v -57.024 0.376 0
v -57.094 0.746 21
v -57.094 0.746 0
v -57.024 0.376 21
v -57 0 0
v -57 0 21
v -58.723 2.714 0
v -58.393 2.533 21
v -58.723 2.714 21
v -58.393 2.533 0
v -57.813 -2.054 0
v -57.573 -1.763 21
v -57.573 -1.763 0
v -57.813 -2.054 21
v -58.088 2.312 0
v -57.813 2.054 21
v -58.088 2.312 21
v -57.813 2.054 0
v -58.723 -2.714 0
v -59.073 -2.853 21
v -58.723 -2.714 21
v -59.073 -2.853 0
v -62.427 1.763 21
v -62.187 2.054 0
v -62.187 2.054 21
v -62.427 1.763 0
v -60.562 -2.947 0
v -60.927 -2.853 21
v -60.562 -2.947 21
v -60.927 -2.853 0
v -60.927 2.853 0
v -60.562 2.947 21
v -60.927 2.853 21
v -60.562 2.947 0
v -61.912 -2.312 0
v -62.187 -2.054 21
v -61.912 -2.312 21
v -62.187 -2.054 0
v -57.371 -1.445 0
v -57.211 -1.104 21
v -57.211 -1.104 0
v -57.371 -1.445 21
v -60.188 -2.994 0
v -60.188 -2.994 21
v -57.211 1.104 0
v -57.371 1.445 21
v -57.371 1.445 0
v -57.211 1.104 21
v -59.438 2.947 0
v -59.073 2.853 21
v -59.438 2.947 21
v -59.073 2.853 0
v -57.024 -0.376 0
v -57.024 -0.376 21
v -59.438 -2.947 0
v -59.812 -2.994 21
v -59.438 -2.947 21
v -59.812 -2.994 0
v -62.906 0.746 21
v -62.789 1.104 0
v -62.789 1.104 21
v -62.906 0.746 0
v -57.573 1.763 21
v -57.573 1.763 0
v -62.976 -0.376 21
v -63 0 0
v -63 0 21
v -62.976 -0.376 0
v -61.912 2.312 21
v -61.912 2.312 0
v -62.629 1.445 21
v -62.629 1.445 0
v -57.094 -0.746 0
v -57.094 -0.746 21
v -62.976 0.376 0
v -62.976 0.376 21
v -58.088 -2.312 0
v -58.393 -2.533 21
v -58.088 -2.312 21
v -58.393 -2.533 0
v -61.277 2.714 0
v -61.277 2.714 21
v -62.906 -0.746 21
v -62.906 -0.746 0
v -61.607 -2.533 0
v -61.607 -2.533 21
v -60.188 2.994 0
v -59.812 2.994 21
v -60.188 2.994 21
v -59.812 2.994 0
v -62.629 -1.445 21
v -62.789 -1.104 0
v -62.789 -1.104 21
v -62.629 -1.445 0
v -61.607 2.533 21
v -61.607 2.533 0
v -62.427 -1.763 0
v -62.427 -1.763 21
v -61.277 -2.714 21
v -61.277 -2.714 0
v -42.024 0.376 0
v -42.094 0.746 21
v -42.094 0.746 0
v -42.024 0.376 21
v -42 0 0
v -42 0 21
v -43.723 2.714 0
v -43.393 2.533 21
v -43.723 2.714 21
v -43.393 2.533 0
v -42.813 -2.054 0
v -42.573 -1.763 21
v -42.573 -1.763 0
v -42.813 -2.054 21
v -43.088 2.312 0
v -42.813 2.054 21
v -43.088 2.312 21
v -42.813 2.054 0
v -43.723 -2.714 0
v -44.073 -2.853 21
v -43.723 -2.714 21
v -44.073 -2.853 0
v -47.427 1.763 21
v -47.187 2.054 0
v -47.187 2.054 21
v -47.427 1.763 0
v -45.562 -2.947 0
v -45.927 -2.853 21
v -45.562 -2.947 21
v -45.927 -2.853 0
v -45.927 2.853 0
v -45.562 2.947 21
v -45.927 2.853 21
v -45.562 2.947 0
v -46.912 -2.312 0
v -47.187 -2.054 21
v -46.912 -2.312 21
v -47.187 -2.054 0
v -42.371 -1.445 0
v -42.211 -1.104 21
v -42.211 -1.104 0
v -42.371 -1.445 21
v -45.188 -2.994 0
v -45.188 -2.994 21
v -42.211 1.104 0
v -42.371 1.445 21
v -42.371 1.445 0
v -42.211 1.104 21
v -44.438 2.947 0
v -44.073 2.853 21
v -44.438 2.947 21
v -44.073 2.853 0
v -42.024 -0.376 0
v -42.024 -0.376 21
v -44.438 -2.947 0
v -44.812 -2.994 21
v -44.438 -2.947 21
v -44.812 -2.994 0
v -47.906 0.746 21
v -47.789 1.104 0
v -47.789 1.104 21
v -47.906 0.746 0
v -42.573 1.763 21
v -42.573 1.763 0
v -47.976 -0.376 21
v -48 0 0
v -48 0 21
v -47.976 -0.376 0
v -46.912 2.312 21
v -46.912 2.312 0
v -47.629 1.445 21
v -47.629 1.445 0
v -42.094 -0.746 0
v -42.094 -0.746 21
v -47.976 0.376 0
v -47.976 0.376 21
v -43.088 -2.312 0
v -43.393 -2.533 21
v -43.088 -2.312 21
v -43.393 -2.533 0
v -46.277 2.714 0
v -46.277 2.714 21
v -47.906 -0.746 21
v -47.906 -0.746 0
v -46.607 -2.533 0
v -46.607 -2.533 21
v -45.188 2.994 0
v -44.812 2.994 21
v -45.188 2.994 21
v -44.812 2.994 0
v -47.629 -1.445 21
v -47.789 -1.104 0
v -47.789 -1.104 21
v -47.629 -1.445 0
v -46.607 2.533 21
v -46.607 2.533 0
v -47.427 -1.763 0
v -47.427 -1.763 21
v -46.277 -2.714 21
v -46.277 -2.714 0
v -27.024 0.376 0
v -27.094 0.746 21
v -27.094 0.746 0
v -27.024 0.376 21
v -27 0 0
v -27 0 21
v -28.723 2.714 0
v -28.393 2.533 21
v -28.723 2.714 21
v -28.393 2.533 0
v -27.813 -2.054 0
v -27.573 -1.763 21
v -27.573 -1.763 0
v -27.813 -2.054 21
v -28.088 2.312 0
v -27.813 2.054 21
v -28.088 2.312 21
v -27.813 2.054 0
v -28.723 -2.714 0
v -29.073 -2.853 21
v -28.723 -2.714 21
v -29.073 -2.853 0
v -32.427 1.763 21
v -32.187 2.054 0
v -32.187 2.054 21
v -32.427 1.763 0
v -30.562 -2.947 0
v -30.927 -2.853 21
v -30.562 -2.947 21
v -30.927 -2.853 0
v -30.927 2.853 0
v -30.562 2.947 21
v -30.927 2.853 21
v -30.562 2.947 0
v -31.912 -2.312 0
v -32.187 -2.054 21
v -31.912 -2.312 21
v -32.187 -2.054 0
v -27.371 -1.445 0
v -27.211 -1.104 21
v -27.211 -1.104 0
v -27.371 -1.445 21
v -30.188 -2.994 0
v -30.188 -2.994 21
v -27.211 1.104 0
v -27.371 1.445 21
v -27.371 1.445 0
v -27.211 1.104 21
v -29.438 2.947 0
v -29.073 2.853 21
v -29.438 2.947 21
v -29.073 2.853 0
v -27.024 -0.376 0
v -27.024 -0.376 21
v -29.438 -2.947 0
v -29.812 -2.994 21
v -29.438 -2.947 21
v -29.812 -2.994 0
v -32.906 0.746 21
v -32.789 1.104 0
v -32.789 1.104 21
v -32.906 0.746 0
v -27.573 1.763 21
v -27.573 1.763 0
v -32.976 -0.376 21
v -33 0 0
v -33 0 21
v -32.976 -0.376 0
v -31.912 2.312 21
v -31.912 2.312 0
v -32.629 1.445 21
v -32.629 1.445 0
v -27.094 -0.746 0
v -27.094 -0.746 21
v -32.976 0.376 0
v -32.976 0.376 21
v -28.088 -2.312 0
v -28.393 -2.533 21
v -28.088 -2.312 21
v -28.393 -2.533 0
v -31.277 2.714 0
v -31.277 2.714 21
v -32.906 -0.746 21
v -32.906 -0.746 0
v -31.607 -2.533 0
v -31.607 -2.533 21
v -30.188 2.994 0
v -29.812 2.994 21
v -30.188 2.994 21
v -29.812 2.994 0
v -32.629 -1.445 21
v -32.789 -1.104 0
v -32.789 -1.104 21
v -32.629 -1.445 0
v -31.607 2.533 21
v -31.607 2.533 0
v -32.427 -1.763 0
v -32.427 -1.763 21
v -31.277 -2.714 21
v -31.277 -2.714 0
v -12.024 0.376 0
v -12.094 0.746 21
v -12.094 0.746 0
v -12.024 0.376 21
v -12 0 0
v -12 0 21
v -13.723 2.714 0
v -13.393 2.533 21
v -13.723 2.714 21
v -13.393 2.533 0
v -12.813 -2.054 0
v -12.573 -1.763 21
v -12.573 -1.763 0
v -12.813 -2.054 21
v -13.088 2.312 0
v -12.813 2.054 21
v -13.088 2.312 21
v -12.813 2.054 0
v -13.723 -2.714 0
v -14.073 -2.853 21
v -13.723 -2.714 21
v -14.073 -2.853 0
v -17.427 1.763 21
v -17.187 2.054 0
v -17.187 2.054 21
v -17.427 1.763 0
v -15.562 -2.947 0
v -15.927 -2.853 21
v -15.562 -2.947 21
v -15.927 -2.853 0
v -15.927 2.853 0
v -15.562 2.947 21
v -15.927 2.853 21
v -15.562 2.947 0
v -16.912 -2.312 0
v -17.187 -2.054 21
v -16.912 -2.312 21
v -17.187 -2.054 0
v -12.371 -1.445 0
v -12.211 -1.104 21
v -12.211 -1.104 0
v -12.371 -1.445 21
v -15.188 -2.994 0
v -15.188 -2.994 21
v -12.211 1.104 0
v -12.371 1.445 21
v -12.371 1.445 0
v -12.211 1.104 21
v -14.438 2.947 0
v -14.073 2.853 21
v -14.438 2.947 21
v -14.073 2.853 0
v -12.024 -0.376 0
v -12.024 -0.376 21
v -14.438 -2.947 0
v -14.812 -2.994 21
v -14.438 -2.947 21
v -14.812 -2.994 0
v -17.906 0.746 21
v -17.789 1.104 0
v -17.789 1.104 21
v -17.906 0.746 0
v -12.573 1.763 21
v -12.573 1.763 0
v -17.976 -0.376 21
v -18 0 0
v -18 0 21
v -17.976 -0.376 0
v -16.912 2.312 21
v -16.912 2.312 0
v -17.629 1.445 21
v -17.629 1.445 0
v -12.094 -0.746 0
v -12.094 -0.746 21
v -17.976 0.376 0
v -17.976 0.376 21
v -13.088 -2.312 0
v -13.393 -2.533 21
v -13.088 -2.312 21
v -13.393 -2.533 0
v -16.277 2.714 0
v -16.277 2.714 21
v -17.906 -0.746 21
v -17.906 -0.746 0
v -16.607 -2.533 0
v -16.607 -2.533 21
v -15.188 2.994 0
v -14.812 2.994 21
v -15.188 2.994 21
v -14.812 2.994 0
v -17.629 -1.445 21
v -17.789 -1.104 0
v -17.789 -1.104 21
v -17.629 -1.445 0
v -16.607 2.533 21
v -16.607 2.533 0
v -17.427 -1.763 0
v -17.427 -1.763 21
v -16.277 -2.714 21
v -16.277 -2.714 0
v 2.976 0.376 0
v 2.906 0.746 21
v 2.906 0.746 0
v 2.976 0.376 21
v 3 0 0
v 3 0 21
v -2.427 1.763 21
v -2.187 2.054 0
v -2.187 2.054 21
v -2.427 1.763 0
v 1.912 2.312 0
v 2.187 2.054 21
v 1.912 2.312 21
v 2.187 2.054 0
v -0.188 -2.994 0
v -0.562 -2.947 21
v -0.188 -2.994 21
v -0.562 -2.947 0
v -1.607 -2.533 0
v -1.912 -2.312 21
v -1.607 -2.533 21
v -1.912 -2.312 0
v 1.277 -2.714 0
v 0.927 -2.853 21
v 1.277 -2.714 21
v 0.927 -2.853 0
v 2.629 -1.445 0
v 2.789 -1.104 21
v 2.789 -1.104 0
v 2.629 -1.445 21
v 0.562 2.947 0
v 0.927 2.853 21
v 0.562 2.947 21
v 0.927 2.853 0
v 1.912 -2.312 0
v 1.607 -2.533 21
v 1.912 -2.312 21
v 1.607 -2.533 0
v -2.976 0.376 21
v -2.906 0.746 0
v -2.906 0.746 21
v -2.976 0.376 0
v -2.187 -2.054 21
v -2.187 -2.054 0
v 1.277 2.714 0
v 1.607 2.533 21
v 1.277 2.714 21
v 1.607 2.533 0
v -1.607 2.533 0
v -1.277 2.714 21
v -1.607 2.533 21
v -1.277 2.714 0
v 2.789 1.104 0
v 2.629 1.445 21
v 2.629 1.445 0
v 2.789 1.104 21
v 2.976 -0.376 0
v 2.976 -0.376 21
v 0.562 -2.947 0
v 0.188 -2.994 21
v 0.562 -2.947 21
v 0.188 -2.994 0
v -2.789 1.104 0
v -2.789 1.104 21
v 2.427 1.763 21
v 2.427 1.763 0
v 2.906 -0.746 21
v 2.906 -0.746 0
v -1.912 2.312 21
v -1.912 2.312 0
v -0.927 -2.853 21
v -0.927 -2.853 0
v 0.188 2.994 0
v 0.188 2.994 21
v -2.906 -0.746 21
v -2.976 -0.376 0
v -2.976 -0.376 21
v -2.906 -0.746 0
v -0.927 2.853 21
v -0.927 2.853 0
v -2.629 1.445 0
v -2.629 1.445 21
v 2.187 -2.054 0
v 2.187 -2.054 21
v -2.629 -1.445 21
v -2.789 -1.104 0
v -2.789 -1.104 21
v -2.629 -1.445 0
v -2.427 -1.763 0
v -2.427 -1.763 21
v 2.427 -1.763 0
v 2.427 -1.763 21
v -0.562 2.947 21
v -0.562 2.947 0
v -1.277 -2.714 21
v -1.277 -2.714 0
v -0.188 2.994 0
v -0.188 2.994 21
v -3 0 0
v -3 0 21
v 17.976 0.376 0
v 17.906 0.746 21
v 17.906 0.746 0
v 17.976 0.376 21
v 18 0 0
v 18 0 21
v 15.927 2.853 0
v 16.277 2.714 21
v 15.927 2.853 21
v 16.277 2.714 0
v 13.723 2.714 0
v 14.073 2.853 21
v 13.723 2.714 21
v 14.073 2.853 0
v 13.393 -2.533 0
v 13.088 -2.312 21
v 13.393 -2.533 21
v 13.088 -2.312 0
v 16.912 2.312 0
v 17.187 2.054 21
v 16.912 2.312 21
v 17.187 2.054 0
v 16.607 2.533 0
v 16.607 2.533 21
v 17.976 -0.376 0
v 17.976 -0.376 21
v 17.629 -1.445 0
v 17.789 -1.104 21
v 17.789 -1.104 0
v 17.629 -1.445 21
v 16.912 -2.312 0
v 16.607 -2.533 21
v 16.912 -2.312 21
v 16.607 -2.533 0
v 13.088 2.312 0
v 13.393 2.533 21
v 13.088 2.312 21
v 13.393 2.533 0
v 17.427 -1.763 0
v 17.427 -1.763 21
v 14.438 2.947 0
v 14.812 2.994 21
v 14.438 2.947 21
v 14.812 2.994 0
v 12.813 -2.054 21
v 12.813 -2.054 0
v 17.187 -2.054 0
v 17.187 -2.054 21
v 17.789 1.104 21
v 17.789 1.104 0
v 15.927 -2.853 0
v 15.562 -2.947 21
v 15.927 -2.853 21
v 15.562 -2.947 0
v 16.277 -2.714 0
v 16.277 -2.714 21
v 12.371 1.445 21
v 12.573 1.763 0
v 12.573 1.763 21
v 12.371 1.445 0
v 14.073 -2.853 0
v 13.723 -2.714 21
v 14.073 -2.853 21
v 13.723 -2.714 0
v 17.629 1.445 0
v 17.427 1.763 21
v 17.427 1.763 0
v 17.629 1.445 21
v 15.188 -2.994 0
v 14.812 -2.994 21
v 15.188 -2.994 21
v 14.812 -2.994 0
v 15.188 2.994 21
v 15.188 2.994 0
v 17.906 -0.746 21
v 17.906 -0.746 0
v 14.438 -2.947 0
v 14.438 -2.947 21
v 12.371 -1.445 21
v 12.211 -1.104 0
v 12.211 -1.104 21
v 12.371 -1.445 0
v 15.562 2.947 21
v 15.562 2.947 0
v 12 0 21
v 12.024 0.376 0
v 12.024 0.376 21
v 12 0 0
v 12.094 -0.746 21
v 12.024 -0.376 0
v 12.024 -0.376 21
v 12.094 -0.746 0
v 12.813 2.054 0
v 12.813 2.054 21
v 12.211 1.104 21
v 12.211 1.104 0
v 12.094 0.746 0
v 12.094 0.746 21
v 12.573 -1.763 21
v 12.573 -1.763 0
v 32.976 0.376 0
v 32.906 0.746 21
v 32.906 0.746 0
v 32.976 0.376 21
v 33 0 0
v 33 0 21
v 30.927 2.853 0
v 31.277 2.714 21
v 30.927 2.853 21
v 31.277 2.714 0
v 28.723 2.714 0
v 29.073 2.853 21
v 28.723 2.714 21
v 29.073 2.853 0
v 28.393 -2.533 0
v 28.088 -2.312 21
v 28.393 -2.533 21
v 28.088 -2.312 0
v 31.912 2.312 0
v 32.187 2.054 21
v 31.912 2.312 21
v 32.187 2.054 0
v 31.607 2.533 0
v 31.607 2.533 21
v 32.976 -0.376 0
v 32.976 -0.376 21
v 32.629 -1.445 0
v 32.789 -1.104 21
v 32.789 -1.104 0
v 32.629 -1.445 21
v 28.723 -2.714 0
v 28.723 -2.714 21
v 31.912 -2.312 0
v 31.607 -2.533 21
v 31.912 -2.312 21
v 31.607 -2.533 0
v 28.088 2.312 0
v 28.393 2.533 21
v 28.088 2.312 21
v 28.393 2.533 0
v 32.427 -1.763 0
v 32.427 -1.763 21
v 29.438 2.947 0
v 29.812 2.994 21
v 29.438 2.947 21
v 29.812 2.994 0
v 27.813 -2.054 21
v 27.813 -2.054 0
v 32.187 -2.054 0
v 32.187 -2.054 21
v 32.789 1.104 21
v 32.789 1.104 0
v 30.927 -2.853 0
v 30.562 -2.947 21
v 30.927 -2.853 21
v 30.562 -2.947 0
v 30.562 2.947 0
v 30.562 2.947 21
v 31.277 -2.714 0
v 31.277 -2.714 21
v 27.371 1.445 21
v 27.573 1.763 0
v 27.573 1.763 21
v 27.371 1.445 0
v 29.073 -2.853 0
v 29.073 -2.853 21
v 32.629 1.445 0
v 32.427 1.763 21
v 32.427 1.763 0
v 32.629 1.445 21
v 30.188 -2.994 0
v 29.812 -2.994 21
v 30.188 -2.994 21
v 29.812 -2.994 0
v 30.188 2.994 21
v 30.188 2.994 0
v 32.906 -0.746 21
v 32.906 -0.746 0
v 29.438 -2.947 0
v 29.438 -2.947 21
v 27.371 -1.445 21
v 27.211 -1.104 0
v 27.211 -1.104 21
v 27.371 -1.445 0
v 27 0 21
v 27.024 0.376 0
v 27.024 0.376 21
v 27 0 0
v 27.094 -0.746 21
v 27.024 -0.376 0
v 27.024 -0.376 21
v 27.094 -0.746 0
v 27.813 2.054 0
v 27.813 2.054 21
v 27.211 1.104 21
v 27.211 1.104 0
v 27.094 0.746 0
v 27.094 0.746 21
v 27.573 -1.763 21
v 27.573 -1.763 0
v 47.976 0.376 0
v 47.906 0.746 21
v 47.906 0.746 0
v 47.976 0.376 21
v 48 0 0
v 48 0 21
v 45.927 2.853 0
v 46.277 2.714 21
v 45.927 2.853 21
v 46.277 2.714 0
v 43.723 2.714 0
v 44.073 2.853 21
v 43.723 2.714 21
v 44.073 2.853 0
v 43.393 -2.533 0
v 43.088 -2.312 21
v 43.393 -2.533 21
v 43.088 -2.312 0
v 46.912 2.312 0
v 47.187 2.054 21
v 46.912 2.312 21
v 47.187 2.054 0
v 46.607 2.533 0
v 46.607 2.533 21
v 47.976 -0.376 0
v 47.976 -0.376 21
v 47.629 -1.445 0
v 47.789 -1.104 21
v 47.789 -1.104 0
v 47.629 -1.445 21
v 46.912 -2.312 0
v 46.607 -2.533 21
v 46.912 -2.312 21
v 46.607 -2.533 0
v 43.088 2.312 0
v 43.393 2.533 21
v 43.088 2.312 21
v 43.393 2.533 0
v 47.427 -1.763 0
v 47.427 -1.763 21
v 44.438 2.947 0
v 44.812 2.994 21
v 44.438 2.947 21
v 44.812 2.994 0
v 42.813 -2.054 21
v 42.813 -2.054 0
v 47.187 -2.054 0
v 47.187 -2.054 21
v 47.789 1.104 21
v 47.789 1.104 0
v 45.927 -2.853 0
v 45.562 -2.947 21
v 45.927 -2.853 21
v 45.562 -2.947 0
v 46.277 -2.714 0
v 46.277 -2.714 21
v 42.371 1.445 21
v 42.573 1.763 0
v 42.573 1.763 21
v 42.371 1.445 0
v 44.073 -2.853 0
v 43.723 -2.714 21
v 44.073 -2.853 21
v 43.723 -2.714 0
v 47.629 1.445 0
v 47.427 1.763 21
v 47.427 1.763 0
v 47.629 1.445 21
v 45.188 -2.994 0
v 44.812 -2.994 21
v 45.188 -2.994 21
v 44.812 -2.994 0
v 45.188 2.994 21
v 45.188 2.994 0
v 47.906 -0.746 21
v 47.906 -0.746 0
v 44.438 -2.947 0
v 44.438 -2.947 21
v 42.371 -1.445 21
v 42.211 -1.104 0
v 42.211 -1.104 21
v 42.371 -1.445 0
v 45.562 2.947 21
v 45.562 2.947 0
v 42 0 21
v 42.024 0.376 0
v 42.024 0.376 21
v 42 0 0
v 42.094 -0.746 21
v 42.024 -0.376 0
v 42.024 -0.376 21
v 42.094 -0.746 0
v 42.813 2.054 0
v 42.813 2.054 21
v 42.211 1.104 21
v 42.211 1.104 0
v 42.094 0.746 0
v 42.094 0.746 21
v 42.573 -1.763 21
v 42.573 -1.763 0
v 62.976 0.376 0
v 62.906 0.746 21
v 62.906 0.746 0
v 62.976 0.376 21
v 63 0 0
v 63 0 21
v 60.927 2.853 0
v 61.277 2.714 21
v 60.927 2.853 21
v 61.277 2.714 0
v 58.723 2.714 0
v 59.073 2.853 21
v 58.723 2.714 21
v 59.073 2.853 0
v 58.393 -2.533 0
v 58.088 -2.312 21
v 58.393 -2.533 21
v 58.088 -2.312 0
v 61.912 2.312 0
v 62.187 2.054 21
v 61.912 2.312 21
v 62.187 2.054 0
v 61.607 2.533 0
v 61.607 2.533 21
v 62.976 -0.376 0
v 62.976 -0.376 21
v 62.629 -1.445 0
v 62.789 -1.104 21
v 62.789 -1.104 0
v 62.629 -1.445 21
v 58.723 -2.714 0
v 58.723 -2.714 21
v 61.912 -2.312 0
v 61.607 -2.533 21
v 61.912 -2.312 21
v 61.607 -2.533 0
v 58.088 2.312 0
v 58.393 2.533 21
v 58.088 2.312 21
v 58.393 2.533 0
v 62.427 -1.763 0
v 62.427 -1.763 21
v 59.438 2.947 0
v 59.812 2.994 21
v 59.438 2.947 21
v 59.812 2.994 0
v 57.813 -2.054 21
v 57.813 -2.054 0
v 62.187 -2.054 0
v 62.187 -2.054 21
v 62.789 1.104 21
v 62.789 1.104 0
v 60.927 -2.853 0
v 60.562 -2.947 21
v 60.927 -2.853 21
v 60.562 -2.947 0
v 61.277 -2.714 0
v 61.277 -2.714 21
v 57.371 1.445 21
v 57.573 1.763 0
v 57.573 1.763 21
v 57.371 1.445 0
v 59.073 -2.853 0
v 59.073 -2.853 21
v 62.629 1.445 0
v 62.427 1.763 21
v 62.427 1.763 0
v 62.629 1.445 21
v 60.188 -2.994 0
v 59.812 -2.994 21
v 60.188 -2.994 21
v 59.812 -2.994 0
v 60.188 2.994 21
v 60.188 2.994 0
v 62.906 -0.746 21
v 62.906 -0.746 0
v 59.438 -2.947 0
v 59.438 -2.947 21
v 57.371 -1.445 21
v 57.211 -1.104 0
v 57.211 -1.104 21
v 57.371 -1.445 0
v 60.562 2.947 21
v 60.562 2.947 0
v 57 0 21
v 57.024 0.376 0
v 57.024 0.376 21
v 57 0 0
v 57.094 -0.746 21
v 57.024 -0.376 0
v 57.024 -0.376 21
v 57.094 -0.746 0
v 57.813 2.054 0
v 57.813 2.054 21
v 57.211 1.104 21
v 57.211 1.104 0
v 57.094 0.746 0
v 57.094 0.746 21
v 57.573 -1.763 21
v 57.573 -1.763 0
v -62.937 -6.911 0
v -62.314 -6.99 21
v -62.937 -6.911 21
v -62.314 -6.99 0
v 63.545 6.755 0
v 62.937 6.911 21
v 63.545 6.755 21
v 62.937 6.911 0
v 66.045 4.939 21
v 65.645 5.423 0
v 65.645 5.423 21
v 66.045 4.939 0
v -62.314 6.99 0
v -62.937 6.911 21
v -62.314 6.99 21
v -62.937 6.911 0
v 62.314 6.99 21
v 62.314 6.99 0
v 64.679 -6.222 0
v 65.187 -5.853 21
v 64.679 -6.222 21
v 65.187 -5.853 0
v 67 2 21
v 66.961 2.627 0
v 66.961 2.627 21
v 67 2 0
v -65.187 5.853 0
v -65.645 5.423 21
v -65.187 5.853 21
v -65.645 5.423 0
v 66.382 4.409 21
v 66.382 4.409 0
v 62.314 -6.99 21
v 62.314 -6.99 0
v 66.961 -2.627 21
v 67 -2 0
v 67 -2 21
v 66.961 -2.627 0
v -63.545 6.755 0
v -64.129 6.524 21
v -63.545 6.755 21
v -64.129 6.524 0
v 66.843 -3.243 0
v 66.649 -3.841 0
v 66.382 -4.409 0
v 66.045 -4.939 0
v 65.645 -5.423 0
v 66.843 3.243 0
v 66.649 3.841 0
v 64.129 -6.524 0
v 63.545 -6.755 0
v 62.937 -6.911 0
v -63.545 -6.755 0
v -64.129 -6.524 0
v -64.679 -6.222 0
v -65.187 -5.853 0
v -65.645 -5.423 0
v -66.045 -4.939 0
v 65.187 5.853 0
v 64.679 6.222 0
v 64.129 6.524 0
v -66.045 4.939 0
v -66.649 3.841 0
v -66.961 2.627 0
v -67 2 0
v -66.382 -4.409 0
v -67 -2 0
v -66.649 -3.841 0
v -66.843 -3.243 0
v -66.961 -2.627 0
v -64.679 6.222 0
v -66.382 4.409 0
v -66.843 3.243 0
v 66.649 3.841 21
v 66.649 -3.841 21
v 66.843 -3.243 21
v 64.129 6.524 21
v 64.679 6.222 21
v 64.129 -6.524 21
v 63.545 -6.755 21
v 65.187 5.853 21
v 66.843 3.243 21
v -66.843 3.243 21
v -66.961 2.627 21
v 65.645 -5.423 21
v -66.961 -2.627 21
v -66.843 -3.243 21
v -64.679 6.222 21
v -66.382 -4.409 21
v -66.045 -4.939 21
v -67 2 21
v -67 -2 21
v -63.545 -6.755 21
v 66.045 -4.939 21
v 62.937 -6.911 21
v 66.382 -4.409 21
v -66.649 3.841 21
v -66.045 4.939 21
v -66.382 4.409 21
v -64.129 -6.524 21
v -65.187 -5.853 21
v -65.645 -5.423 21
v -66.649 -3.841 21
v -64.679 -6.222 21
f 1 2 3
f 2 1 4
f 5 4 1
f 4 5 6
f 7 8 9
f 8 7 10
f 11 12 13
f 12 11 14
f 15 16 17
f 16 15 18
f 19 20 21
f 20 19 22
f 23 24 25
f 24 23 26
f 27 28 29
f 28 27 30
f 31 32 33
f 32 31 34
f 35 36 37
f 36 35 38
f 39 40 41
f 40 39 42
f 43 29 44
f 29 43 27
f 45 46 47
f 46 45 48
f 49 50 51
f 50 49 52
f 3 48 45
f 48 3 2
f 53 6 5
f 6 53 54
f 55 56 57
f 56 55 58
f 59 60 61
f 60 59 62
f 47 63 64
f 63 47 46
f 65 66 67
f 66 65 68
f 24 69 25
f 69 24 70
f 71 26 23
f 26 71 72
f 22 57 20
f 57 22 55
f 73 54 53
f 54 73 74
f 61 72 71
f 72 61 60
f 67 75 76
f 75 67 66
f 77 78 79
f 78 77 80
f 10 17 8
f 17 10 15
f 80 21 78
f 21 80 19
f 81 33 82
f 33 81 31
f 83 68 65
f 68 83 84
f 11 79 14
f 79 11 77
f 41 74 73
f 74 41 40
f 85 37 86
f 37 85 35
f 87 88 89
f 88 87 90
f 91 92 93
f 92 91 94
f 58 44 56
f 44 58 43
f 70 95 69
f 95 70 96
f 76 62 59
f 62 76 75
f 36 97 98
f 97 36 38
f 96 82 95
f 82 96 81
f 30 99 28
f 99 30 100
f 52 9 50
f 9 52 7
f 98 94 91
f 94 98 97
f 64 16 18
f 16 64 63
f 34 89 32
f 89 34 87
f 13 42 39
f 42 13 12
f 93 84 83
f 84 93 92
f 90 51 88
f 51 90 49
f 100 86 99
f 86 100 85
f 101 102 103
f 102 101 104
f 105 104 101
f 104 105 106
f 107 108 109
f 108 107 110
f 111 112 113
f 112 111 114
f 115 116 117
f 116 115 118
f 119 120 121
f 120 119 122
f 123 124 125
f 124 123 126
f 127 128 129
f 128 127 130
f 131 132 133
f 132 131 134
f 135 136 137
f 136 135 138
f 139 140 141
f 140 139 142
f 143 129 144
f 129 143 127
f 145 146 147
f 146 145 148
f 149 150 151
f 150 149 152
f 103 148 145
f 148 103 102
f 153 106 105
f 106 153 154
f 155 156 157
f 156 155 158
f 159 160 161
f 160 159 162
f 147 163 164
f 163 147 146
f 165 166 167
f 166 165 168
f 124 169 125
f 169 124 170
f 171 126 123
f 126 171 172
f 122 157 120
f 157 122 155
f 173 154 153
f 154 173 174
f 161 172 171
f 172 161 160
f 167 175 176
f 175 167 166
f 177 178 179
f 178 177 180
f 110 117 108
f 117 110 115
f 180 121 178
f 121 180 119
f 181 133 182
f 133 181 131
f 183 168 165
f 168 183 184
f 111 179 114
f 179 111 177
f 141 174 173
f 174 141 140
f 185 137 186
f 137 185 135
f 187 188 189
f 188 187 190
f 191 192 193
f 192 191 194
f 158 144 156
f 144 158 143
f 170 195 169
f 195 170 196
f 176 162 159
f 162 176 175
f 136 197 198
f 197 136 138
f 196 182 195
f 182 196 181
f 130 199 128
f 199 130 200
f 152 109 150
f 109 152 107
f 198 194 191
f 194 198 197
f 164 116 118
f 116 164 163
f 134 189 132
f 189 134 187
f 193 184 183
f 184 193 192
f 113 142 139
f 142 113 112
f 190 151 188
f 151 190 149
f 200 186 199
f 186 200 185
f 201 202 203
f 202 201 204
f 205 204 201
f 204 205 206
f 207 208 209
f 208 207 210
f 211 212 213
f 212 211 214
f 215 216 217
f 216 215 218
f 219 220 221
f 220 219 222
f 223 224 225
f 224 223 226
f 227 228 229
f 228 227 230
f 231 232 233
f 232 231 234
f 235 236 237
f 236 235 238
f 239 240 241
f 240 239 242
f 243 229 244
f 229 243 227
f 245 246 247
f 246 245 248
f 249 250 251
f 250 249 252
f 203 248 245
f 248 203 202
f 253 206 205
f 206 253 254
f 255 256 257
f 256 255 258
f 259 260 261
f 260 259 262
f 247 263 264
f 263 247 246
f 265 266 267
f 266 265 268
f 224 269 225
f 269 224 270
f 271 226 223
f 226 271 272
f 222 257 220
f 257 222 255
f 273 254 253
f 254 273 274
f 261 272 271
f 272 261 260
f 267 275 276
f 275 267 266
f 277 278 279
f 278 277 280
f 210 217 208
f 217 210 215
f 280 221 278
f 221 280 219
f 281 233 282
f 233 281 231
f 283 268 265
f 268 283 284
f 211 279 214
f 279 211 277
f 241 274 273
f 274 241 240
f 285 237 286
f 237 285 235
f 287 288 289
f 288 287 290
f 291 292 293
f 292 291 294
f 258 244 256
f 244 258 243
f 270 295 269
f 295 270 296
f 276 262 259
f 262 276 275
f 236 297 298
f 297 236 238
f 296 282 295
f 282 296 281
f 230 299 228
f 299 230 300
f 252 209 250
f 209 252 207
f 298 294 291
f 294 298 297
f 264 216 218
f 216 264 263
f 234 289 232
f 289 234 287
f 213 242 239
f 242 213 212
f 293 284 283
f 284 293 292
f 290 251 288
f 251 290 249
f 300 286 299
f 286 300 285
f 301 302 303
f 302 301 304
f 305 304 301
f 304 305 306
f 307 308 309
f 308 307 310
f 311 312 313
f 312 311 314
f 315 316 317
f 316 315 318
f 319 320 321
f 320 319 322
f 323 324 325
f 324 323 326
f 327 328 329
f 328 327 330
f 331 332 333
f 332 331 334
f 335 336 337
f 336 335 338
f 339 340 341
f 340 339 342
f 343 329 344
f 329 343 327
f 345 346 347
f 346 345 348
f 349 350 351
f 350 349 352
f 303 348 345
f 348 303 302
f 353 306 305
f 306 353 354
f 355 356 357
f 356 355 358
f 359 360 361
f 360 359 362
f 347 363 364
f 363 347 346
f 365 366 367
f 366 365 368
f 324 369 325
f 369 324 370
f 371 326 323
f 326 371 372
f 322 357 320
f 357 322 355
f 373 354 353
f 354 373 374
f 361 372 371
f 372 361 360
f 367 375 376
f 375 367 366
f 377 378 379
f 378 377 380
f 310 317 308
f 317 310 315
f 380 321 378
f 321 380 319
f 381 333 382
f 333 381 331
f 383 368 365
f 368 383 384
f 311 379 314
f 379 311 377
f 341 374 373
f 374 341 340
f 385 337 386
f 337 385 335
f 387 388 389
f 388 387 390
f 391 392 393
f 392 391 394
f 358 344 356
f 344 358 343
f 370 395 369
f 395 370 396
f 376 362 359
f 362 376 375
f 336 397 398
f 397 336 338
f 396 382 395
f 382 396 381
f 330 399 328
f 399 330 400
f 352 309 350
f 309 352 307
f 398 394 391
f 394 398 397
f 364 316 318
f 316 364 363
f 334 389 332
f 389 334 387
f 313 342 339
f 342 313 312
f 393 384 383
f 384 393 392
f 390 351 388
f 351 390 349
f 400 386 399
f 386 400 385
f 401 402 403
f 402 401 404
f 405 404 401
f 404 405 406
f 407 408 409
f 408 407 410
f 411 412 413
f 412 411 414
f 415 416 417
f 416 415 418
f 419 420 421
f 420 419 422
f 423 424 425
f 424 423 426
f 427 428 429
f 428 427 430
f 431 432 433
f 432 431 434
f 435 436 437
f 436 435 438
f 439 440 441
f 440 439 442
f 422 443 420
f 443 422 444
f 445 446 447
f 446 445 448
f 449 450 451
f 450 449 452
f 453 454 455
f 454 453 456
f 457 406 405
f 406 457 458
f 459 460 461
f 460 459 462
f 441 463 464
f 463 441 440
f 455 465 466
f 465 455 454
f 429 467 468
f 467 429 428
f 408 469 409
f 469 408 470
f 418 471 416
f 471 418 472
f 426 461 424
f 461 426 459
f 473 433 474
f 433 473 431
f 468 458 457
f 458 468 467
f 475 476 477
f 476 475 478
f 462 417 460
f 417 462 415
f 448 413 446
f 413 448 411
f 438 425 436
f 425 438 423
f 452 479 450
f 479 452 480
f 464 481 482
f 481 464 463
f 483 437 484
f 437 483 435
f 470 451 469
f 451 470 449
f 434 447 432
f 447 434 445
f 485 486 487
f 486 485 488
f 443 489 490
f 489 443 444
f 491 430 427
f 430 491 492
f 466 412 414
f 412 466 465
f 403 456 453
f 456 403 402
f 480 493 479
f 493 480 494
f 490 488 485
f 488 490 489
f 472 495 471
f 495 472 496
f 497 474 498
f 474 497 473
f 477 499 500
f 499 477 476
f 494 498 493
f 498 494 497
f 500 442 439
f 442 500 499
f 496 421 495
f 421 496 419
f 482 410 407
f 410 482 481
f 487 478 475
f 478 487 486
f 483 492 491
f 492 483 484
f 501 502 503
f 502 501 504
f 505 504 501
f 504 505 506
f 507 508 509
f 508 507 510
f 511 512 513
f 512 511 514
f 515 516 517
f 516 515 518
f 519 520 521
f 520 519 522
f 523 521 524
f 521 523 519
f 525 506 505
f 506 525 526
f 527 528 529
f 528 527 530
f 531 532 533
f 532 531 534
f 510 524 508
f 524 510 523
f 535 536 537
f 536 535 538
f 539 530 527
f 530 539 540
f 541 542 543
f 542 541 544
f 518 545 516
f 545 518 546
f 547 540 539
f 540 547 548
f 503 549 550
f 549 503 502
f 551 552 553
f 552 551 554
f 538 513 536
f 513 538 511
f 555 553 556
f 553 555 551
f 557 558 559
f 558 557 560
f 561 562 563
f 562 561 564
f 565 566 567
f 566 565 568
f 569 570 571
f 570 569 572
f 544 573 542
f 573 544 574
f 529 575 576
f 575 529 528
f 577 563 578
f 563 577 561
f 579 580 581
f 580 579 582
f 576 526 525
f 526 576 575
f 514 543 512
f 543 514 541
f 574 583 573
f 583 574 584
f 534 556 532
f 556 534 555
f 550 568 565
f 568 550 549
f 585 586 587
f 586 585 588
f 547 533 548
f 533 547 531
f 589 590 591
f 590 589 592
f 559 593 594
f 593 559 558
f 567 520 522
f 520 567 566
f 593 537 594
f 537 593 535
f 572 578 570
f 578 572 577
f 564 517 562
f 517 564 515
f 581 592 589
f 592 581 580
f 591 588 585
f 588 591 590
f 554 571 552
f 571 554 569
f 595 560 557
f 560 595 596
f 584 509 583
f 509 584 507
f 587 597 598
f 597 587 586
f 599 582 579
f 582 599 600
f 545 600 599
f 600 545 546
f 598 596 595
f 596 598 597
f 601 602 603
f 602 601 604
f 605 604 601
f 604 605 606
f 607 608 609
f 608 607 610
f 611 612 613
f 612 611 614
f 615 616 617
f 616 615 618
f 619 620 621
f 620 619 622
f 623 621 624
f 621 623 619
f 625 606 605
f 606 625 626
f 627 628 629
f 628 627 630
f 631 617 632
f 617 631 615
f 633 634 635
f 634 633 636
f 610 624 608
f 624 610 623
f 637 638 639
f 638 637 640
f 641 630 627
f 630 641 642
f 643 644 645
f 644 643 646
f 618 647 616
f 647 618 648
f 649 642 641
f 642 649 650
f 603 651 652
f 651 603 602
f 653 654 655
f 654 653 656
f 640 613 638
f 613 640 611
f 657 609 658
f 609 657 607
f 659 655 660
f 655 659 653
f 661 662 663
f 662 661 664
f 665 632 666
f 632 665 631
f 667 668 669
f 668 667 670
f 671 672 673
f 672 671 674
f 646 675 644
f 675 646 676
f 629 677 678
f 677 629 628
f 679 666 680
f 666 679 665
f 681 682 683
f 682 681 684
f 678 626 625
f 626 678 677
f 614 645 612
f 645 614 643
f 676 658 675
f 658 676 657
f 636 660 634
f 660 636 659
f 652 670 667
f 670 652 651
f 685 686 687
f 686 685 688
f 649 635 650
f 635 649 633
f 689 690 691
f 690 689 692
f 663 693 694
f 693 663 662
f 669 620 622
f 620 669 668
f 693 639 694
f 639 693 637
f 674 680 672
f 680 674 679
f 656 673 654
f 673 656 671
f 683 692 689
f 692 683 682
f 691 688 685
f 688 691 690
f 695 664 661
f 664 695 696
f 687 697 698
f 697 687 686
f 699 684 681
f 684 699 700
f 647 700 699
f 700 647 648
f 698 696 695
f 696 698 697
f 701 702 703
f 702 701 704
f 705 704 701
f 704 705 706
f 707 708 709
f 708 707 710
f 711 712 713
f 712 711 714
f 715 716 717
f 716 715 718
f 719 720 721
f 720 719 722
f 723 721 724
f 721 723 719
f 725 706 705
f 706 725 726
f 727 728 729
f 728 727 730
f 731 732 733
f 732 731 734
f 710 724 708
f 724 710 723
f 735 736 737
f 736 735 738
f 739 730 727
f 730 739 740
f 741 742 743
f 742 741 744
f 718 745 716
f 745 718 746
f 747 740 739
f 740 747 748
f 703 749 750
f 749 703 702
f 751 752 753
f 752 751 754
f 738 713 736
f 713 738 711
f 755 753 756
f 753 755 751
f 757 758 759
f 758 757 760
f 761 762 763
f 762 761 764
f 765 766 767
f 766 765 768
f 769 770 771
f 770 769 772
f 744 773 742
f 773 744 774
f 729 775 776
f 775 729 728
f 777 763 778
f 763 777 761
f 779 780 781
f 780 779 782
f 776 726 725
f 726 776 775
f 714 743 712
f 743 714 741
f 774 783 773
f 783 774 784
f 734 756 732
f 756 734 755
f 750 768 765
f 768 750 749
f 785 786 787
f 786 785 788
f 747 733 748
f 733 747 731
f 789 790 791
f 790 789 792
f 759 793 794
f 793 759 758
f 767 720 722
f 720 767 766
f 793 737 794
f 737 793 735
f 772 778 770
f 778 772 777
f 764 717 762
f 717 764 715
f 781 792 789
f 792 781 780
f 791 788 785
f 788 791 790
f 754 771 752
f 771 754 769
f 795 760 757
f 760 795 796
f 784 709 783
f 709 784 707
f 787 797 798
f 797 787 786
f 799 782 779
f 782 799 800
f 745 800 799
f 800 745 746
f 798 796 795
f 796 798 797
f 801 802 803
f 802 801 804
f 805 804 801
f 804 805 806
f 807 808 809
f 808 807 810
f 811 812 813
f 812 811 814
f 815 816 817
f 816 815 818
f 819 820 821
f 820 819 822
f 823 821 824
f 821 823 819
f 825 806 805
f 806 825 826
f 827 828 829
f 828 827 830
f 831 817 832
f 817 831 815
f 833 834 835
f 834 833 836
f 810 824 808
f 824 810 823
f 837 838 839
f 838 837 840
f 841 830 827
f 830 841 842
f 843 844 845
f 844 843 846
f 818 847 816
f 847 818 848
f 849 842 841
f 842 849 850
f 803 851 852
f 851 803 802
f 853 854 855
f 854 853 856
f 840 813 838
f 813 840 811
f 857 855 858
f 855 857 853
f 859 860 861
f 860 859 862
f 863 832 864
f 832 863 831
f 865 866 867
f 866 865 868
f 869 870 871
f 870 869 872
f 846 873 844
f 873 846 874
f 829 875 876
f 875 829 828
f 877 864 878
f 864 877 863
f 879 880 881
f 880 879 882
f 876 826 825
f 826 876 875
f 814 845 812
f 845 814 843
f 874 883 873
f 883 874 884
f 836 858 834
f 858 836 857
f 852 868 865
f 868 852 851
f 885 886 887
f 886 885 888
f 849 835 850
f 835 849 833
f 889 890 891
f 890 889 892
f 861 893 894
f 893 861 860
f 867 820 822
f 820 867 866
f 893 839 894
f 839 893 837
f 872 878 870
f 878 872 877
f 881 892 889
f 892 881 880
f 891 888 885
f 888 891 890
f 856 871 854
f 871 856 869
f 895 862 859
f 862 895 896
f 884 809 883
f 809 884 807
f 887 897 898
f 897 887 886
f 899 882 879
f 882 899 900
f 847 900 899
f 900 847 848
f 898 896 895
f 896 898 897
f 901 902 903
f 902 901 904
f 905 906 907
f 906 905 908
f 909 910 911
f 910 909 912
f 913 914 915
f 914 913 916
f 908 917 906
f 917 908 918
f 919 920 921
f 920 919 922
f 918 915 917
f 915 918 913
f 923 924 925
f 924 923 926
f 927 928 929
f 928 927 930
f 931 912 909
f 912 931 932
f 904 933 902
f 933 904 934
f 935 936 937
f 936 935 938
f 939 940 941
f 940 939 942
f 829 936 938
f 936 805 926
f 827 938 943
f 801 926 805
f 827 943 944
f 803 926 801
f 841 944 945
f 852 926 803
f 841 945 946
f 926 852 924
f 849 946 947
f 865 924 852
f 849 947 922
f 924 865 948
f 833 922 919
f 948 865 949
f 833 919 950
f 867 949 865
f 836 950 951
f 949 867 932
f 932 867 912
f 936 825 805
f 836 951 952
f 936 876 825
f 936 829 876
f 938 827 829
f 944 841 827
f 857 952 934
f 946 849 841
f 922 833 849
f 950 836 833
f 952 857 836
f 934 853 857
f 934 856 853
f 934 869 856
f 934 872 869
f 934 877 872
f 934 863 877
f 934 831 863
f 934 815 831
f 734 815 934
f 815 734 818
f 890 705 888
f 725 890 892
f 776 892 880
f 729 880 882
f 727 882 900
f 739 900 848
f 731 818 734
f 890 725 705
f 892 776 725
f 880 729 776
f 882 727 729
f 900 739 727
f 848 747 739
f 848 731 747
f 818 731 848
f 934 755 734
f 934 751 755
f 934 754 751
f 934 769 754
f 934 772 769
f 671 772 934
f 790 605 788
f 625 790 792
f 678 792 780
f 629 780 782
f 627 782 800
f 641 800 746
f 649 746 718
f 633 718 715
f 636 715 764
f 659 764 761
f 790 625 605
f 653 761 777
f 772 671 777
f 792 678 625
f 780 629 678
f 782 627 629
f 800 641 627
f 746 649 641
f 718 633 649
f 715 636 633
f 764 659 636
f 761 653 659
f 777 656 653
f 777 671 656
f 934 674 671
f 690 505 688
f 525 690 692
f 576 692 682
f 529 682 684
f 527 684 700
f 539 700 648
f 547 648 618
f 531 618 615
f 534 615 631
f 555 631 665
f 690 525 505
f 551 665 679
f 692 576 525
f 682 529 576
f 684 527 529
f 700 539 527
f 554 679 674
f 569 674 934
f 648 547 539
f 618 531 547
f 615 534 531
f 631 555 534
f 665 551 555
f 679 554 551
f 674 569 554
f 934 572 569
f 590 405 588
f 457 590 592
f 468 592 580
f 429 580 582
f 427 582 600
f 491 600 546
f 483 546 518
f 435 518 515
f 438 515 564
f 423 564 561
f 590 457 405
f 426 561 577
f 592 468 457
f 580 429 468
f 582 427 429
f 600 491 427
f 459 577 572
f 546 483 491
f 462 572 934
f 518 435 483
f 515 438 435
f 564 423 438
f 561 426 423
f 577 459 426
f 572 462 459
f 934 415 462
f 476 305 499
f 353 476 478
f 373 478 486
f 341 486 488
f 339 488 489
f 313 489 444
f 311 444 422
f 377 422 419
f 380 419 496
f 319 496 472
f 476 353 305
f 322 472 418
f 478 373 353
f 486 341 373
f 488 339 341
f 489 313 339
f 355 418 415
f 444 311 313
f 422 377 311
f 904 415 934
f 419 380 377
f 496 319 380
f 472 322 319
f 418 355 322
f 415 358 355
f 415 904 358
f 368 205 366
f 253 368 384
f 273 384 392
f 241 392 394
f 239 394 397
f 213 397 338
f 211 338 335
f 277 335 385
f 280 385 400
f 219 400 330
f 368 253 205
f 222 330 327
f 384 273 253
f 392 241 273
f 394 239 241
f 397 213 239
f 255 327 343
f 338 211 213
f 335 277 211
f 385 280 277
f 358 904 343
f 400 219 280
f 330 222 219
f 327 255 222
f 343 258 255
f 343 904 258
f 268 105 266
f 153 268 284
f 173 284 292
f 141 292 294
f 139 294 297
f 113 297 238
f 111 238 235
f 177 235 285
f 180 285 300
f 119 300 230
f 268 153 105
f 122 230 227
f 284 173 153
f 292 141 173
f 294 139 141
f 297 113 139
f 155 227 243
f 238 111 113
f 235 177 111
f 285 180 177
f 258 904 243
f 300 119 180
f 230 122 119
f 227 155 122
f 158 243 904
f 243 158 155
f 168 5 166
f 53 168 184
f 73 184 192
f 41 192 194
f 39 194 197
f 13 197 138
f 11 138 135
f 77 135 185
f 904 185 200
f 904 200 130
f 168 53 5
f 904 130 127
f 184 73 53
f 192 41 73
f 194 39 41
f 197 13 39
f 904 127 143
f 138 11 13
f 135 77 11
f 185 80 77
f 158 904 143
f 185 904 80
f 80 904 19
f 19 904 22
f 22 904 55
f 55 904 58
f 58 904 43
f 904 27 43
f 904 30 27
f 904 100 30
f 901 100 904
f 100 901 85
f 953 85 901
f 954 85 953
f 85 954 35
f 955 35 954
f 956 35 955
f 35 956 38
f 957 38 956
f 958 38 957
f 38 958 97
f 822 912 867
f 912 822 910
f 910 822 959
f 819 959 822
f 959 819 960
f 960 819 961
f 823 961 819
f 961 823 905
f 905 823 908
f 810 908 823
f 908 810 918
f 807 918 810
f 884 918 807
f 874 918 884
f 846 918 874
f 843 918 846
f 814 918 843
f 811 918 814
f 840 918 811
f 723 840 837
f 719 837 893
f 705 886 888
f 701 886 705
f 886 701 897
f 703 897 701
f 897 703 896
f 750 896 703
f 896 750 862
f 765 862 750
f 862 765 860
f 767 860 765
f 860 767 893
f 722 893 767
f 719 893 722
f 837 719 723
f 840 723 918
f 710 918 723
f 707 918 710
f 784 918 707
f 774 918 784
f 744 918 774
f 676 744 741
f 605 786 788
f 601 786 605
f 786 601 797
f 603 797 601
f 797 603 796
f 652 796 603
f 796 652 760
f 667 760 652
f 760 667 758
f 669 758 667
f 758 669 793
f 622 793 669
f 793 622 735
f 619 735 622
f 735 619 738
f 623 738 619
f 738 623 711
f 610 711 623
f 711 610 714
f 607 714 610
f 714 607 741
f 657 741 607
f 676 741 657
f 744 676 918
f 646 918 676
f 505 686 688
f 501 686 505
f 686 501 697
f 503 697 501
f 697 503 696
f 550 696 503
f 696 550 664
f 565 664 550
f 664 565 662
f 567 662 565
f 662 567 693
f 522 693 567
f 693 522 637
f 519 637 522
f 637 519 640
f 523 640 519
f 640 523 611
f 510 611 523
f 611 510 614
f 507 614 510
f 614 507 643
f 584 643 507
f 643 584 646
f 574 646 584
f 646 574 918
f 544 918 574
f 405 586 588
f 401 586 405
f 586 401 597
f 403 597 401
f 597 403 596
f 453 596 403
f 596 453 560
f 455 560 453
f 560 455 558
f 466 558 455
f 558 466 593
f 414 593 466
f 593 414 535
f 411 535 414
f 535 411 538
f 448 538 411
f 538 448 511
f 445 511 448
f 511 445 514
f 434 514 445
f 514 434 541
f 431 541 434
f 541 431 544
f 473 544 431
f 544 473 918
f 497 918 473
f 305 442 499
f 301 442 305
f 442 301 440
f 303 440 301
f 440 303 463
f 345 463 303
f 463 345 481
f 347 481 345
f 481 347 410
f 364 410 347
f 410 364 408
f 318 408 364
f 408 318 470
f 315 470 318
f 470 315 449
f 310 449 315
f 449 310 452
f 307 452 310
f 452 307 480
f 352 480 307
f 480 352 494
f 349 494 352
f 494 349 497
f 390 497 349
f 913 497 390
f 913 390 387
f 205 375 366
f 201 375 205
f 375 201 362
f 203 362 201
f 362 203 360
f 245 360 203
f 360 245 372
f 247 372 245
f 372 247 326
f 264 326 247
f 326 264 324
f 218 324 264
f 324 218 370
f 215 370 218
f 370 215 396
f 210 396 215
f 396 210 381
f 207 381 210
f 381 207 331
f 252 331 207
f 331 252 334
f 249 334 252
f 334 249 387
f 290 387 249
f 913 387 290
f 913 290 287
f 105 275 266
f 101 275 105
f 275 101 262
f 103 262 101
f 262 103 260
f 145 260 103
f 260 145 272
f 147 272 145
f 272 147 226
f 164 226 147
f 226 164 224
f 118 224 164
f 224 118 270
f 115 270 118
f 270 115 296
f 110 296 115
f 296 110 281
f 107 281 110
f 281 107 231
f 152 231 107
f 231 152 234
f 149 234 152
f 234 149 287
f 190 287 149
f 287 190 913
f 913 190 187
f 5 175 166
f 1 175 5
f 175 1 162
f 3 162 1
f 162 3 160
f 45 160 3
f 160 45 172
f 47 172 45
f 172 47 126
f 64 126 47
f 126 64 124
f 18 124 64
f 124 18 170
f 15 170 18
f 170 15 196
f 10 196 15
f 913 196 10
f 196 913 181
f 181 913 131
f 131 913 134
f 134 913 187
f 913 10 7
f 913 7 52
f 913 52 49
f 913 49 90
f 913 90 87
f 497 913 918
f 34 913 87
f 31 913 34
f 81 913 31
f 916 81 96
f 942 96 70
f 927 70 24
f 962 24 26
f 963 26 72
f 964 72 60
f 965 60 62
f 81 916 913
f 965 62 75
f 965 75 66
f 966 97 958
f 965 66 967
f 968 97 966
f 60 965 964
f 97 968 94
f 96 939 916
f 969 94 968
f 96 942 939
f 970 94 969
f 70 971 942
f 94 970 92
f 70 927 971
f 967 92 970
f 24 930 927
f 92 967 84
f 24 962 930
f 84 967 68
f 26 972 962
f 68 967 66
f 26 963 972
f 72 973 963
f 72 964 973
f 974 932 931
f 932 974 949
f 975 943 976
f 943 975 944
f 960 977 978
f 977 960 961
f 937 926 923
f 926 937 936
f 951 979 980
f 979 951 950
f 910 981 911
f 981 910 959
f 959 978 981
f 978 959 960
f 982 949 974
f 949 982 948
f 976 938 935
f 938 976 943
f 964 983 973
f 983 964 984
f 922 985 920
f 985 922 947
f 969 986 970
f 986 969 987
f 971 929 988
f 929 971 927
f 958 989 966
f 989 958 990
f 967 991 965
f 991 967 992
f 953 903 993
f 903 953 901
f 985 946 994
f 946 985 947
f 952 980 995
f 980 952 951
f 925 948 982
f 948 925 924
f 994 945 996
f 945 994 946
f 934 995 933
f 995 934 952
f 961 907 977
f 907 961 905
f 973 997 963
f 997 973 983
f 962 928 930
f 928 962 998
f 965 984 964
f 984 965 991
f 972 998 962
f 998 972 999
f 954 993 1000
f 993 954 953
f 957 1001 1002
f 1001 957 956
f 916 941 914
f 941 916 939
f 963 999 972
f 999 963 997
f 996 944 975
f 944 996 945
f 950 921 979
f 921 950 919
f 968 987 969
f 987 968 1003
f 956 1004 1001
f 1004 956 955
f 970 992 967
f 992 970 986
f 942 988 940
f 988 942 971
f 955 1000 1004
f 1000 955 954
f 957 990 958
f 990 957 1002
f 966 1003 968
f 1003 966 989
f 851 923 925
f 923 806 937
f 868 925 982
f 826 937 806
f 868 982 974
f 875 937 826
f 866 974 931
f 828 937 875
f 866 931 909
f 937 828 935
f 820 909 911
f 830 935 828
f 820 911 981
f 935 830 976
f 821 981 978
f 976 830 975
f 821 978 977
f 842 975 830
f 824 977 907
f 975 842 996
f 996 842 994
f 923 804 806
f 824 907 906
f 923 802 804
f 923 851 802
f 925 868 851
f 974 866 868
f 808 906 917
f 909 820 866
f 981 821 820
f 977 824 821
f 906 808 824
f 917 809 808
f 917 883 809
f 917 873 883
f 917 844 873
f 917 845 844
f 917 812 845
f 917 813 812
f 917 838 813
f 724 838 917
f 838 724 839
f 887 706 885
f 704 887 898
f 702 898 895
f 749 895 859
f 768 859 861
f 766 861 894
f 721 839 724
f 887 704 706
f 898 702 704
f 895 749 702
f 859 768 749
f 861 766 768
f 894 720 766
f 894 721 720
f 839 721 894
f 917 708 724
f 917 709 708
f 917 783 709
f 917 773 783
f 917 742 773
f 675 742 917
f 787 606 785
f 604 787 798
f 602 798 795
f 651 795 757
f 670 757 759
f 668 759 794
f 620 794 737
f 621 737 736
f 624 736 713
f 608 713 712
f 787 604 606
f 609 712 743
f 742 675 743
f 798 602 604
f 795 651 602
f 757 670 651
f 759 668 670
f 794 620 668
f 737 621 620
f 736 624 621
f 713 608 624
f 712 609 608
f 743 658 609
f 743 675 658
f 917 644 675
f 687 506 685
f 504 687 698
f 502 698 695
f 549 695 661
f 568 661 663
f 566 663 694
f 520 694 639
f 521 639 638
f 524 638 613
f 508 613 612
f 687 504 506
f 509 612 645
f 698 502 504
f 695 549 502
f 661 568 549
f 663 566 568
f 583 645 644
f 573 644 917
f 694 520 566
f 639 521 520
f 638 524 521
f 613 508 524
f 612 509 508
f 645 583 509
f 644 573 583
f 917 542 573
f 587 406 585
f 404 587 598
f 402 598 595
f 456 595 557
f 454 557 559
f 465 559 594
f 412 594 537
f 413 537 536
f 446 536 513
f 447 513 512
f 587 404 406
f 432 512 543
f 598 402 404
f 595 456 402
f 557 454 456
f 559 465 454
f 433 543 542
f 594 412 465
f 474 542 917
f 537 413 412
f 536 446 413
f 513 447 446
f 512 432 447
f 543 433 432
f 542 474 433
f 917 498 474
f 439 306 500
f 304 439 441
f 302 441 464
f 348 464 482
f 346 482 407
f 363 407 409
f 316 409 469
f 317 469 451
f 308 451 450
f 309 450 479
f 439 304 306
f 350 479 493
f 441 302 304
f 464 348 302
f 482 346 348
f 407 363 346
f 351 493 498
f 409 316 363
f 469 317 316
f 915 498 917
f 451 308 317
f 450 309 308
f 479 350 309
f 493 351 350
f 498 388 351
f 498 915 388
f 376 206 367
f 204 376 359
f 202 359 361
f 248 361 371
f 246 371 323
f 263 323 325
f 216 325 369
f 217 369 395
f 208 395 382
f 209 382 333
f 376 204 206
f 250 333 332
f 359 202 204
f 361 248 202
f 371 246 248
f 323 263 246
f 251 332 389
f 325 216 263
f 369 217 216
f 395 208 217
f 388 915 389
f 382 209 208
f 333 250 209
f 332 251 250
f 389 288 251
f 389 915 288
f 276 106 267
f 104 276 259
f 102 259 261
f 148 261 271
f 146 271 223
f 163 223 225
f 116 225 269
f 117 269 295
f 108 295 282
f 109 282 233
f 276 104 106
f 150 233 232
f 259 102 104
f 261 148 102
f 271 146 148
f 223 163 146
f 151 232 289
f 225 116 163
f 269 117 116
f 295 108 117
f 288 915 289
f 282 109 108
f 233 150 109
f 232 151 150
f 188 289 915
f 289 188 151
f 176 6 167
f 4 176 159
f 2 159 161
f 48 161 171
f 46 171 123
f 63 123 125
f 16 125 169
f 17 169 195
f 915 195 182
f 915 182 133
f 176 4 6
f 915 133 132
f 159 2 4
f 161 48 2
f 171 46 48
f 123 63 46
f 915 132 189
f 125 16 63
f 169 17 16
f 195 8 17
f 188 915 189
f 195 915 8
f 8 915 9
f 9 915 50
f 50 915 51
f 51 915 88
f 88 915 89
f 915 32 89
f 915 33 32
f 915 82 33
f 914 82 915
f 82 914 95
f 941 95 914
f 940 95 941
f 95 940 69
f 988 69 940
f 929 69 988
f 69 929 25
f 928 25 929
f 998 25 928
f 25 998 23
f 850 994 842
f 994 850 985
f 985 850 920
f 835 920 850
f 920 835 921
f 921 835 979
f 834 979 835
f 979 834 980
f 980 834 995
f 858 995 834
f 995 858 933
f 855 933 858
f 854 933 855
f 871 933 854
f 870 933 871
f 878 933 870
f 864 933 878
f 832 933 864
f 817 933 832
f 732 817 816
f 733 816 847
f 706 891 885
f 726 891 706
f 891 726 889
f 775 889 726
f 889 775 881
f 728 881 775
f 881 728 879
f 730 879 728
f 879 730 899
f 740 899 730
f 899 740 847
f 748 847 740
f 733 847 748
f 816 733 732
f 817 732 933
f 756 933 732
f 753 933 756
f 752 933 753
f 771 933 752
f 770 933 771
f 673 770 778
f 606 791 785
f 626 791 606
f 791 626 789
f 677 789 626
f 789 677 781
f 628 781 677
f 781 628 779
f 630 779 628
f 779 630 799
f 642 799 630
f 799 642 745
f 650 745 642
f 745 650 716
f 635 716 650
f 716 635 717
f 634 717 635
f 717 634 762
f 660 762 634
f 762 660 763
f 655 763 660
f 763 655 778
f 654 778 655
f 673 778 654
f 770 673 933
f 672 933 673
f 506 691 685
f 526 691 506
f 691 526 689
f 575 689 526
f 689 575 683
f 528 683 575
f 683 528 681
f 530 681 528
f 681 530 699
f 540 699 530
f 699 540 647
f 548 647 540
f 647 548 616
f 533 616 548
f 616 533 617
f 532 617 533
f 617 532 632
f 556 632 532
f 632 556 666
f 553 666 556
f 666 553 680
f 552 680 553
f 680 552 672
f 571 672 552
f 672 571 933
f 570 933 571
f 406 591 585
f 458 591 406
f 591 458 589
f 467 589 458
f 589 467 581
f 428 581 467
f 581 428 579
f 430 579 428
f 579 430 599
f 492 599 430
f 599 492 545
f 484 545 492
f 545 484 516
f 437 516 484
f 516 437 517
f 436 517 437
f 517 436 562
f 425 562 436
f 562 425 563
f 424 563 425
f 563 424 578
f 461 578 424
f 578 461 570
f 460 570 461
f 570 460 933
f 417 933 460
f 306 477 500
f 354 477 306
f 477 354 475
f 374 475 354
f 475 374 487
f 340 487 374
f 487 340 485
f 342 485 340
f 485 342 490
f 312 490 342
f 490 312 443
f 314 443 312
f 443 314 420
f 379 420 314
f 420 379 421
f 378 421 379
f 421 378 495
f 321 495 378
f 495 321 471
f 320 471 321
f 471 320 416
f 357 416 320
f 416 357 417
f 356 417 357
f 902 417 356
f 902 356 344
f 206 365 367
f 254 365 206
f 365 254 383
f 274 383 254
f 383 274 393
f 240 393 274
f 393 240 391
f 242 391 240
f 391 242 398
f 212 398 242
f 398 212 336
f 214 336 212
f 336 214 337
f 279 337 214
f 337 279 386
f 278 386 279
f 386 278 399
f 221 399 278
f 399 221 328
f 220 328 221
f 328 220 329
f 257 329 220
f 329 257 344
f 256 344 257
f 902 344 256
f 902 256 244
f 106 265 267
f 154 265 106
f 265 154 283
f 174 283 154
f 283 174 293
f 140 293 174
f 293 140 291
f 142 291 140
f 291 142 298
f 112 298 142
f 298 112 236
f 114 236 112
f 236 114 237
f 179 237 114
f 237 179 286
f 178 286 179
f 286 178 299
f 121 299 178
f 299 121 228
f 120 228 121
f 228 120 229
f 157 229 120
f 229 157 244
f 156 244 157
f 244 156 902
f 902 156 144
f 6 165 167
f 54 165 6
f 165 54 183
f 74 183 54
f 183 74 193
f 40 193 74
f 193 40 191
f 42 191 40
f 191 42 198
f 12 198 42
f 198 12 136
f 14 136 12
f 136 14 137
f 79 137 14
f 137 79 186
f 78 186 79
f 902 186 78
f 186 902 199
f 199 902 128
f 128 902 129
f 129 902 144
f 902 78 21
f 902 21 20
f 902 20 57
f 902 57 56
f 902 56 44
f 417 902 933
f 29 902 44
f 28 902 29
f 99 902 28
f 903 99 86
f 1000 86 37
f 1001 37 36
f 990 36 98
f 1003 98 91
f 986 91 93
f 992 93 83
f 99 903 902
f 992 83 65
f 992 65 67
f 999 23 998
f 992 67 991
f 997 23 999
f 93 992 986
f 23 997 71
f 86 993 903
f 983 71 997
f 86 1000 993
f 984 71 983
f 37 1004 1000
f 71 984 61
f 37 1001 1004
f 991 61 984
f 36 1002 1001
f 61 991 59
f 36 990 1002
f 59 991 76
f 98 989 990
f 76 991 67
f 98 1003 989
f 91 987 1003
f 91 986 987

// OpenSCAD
$fn = 50;


difference() {
	union() {
		hull() {
			translate(v = [-62.0000000000, 2.0000000000, 0]) {
				cylinder(h = 21, r = 5);
			}
			translate(v = [62.0000000000, 2.0000000000, 0]) {
				cylinder(h = 21, r = 5);
			}
			translate(v = [-62.0000000000, -2.0000000000, 0]) {
				cylinder(h = 21, r = 5);
			}
			translate(v = [62.0000000000, -2.0000000000, 0]) {
				cylinder(h = 21, r = 5);
			}
		}
	}
	union() {
		translate(v = [-60.0000000000, 0.0000000000, 0]) {
			translate(v = [0, 0, -100]) {
				cylinder(h = 200, r = 3.0000000000);
			}
		}
		translate(v = [-45.0000000000, 0.0000000000, 0]) {
			translate(v = [0, 0, -100]) {
				cylinder(h = 200, r = 3.0000000000);
			}
		}
		translate(v = [-30.0000000000, 0.0000000000, 0]) {
			translate(v = [0, 0, -100]) {
				cylinder(h = 200, r = 3.0000000000);
			}
		}
		translate(v = [-15.0000000000, 0.0000000000, 0]) {
			translate(v = [0, 0, -100]) {
				cylinder(h = 200, r = 3.0000000000);
			}
		}
		translate(v = [0, 0, -100]) {
			cylinder(h = 200, r = 3.0000000000);
		}
		translate(v = [15.0000000000, 0.0000000000, 0]) {
			translate(v = [0, 0, -100]) {
				cylinder(h = 200, r = 3.0000000000);
			}
		}
		translate(v = [30.0000000000, 0.0000000000, 0]) {
			translate(v = [0, 0, -100]) {
				cylinder(h = 200, r = 3.0000000000);
			}
		}
		translate(v = [45.0000000000, 0.0000000000, 0]) {
			translate(v = [0, 0, -100]) {
				cylinder(h = 200, r = 3.0000000000);
			}
		}
		translate(v = [60.0000000000, 0.0000000000, 0]) {
			translate(v = [0, 0, -100]) {
				cylinder(h = 200, r = 3.0000000000);
			}
		}
	}
}
